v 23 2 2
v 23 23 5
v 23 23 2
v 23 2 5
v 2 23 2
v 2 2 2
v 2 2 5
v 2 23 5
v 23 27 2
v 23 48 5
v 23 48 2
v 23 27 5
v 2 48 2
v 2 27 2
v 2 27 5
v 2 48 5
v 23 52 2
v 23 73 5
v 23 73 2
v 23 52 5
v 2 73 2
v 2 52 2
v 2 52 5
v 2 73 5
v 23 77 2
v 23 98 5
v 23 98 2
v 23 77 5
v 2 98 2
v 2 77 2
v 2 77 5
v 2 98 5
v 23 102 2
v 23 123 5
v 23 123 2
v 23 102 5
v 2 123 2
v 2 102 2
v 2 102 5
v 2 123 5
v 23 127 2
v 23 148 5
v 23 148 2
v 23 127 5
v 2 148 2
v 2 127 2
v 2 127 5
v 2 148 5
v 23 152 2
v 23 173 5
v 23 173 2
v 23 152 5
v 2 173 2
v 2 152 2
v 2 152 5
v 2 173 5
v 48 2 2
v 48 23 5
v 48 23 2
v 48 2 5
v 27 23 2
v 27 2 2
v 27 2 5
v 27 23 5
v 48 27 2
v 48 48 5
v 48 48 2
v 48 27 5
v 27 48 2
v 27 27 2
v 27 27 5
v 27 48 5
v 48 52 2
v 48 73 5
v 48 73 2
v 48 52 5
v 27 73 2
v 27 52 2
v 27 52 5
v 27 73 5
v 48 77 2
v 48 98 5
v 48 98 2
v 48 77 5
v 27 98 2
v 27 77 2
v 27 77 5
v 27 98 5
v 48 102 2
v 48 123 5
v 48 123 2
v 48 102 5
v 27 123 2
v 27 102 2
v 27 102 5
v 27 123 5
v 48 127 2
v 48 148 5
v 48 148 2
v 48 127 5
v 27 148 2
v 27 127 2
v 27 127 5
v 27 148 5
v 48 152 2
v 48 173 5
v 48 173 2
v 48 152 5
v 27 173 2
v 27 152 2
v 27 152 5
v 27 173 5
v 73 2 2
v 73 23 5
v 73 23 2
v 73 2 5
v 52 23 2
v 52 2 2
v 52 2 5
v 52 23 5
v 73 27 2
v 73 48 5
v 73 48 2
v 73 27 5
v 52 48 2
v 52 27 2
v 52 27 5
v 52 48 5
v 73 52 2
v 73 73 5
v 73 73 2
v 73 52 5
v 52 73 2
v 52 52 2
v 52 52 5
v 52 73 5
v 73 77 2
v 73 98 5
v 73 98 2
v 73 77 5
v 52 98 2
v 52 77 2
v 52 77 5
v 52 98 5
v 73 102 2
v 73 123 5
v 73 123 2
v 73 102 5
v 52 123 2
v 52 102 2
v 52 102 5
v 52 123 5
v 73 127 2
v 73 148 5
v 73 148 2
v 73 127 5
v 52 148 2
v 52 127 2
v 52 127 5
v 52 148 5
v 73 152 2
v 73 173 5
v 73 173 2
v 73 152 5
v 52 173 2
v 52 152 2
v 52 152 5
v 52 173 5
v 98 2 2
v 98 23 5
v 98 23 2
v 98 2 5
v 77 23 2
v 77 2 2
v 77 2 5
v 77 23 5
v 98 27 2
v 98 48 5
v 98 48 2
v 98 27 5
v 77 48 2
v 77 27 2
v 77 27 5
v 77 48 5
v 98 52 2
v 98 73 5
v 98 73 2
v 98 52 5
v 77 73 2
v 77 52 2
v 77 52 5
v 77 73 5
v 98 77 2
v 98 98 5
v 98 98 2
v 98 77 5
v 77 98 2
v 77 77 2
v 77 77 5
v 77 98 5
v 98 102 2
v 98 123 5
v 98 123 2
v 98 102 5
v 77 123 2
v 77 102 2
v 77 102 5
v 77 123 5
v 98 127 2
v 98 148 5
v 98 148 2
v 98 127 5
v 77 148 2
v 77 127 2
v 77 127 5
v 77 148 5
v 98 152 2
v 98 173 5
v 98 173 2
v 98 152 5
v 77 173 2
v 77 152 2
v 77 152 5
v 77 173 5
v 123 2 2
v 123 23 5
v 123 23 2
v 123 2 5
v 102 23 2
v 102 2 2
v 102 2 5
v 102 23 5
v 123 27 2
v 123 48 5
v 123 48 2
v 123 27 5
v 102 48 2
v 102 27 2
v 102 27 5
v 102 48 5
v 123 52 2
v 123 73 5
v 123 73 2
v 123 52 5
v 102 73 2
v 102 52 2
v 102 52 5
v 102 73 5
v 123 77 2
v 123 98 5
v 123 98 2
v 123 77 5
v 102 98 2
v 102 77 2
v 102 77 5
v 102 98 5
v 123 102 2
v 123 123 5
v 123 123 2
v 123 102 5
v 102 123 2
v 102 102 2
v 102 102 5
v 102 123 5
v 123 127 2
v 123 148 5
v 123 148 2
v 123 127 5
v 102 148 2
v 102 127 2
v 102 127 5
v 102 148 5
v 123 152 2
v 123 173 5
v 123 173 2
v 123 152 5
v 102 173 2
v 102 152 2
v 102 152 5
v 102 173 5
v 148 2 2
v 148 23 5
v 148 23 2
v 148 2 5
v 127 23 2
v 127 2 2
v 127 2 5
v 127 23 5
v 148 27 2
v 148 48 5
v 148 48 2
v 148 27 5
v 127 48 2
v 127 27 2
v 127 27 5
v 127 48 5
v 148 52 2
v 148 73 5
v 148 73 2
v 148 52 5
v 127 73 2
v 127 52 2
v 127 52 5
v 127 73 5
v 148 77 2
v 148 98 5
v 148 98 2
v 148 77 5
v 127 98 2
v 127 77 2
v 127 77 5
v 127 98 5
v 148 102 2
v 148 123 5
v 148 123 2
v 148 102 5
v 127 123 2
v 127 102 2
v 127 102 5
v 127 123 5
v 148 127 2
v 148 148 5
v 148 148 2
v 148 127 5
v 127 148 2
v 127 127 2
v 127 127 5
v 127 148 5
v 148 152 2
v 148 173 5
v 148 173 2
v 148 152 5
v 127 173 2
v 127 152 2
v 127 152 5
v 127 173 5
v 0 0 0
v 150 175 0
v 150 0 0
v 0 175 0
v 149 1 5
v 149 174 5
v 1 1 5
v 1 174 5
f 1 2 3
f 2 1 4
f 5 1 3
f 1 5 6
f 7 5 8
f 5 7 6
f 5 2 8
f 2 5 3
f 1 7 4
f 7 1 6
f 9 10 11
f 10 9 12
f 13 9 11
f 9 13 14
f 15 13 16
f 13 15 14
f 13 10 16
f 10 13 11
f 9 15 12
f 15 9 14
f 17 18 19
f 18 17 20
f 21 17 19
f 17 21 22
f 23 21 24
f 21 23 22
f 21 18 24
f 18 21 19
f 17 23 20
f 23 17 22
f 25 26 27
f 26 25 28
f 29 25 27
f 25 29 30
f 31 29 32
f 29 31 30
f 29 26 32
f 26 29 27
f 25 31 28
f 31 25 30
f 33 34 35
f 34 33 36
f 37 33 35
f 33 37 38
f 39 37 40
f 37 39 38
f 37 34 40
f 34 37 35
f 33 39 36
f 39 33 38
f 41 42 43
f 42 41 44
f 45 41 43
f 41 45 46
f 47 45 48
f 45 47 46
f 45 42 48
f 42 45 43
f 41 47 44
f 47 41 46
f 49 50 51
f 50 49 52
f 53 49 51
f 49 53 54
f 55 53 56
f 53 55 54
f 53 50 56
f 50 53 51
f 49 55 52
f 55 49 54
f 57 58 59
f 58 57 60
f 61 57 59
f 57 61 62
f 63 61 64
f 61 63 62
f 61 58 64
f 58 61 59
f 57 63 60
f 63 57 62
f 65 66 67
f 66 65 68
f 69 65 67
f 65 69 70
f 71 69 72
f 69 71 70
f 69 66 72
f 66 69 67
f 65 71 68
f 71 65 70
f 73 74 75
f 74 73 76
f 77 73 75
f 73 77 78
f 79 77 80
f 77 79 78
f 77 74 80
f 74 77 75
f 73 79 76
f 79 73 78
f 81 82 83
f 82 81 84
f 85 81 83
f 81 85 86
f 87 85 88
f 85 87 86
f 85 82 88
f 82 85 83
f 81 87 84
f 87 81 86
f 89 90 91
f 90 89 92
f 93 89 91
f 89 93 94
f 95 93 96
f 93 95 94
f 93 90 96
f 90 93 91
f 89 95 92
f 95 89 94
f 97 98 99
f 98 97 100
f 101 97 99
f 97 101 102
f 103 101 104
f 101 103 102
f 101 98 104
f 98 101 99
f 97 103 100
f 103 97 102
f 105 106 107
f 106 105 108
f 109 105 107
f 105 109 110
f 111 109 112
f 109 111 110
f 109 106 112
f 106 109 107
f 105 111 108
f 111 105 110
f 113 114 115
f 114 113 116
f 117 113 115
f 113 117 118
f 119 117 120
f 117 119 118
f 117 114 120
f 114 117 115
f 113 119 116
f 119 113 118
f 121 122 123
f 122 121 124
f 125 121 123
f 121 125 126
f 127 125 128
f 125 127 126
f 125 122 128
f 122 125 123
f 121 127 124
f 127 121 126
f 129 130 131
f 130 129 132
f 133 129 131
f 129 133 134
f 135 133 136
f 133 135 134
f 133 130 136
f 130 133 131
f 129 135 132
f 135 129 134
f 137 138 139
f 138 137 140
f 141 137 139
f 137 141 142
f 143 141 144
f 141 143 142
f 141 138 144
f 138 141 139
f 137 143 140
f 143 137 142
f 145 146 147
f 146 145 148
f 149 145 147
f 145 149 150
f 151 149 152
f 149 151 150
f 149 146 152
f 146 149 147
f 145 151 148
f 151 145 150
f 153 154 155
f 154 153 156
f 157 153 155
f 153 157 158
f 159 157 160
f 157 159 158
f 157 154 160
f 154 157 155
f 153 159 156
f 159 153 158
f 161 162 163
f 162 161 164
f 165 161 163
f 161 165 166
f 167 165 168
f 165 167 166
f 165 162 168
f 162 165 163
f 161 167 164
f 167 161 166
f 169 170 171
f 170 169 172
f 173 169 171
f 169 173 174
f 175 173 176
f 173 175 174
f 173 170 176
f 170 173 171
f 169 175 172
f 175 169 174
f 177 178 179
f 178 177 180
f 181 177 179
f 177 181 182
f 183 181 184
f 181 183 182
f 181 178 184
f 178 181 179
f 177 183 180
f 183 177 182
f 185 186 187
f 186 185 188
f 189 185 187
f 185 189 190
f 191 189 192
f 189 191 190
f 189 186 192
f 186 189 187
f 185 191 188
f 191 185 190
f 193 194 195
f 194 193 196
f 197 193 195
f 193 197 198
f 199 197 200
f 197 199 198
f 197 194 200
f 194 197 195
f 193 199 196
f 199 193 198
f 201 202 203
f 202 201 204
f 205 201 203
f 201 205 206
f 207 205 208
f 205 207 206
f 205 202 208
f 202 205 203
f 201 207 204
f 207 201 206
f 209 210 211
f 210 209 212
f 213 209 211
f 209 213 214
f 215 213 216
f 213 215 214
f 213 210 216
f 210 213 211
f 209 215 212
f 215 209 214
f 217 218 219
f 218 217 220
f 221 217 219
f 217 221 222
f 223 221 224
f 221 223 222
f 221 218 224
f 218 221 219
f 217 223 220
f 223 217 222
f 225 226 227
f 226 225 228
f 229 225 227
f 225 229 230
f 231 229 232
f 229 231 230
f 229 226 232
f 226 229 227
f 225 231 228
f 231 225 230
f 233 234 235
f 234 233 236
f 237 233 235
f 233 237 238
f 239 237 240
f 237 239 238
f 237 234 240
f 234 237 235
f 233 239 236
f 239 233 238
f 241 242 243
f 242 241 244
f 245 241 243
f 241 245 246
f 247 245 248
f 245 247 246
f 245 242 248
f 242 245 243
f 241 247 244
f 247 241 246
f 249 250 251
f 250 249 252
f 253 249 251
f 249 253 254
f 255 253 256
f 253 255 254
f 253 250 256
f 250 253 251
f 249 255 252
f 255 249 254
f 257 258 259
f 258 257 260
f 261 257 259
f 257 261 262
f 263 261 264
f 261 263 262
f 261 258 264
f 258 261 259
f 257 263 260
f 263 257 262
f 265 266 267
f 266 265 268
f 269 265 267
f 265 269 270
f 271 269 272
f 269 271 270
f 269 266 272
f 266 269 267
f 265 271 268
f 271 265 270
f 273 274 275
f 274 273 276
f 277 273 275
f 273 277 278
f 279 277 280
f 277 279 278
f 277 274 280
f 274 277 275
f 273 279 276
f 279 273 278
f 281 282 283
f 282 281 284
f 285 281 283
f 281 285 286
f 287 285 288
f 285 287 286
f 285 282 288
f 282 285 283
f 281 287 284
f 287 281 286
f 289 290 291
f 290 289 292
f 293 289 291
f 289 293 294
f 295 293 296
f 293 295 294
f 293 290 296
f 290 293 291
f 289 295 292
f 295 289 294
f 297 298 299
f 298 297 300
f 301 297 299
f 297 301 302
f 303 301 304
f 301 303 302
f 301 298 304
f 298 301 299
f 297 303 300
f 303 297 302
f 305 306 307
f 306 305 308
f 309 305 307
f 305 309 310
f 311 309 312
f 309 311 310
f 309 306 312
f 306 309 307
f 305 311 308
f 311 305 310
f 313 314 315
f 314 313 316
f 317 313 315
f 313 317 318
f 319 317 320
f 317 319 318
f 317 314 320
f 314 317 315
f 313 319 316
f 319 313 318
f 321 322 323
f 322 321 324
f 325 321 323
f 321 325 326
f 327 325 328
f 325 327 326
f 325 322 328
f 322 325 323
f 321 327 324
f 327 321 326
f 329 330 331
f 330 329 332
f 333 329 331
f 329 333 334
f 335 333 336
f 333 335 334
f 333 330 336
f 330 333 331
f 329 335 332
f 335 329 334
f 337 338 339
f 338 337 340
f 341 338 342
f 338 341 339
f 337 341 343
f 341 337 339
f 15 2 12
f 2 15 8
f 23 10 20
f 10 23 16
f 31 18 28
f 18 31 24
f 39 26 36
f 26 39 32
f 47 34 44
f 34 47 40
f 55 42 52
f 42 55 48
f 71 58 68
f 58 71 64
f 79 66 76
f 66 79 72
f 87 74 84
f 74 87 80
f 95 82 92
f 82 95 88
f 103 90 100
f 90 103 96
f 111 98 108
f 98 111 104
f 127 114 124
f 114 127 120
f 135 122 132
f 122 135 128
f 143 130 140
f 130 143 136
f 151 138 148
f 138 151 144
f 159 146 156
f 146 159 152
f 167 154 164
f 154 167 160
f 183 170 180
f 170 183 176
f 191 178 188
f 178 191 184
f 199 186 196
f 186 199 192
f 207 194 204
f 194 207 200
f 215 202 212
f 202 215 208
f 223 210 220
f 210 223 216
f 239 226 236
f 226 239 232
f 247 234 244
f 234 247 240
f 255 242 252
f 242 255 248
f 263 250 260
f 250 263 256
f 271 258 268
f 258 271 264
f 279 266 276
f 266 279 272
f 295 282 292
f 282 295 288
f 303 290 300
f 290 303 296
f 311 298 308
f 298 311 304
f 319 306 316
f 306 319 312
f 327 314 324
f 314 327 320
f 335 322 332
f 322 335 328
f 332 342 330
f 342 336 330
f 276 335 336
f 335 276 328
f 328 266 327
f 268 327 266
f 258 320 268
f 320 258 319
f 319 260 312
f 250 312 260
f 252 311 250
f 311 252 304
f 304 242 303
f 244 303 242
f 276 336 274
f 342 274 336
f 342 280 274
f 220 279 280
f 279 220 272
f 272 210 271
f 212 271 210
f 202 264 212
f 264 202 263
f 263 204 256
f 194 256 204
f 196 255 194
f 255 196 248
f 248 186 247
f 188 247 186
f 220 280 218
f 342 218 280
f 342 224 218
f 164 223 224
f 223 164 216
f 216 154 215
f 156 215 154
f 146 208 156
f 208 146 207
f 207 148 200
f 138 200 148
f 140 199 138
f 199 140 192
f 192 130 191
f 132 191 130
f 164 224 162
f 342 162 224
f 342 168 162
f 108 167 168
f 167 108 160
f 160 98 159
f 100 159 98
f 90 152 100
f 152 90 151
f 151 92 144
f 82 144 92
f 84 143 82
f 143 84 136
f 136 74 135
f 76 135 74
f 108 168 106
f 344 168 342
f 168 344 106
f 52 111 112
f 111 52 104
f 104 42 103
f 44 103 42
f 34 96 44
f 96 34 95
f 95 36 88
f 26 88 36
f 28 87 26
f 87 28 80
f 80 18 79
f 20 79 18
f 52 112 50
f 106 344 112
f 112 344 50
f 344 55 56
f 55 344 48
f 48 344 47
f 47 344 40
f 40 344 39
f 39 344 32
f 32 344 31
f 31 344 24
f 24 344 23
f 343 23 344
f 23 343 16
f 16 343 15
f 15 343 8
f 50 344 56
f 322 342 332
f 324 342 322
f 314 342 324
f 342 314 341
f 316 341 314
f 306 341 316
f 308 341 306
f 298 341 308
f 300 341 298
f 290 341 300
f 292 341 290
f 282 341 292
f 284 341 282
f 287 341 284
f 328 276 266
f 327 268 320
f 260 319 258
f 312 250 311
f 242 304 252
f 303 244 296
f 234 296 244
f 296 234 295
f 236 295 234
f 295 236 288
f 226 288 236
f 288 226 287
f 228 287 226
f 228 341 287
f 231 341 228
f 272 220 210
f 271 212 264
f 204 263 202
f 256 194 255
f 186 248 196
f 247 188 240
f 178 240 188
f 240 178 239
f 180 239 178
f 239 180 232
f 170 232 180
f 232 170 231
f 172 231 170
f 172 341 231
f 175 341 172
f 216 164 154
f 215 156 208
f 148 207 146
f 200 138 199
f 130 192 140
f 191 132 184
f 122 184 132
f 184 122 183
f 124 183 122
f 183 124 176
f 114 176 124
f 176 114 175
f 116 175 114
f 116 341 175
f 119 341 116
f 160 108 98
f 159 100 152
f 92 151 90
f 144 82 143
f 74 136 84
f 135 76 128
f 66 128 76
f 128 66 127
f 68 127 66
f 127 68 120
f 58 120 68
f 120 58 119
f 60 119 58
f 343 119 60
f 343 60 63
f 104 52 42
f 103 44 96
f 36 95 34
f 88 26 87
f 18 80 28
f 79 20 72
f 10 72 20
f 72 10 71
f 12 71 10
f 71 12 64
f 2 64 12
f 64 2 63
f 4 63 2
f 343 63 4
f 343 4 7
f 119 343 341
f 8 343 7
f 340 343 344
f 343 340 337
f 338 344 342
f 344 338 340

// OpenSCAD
// Copyright 2023 Stefano Linguerri
//
// Licensed under the Apache License, Version 2.0 (the "License");
// you may not use this file except in compliance with the License.
// You may obtain a copy of the License at
// http://www.apache.org/licenses/LICENSE-2.0
//
// Unless required by applicable law or agreed to in writing, software
// distributed under the License is distributed on an "AS IS" BASIS,
// WITHOUT WARRANTIES OR CONDITIONS OF ANY KIND, either express or implied.¢
// See the License for the specific language governing permissions and
// limitations under the License.

//Number of columns for this tray
cols = 6;
//Number of rows for this tray
rows = 7;
//heigh (thickness) of this tray
height = 5;
//new base width 
new_base_width = 25;
//new base length 
new_base_length = 25;
// existing base width of adapted models
adapted_base_width = 21;//.1
// existing base length of adapted models
adapted_base_length = 21;//.1
//minimum bottom height (thickness) of the insets for the bases
height_offset = 2;
//Inset of the top of the tray: greater the value greater the slope of the tray
inset = 1;
//if base adapted are round (in this case adapted_base_width is considered as the diameter of the round base)
isRound_adapted = false;
//magnets height (if greater than 1 will generate the insets)
magnets_height = 0.0;//.1
//magnets radius
magnets_radius = 0.0;//.1
//if the tray is for lance formation, use only the number of rows to genrate the tray
is_lance_formation = false;
//Create a standard (non an adpater) movement tray for given new_base_length x new_base_width
create_empty_movement_tray = false;
empty_Movement_Tray_Type="S"; // [4:four walls, 3:Three walls]
//Put a mark to show the new base widh/length on the adapter
markBases = false;

module tray(cols, rows, height, new_base_width, new_base_length, adapted_base_width, adapted_base_length, inset, margin_for_empty_tray) {
    
        b_total_cols = (new_base_width * cols) + margin_for_empty_tray;
        b_total_rows = (new_base_length * rows)+ margin_for_empty_tray;
        
        t_total_cols = (new_base_width * cols - inset *2) + margin_for_empty_tray;
        t_total_rows = (new_base_length * rows - inset *2) + margin_for_empty_tray;
        
         polyhedron(
            points=[
                    [0,0,0],                        //base bottom left
                    [b_total_cols,0,0],             //base bottom right
                    [b_total_cols,b_total_rows,0],  //base top right
                    [0,b_total_rows,0],             //base top left
        

                    [inset,  inset,   height],                              //surface bottom left
                    [inset + t_total_cols, inset,  height],                 //surface bottom right
                    [inset + t_total_cols, inset + t_total_rows, height],   //surface top right
                    [inset,   inset + t_total_rows,  height]                //surface top left
                ],
            faces =[
                        [0,1,2,3],
                        [4,5,1,0],
                        [5,6,2,1],
                        [6,7,3,2],
                        [7,4,0,3],
                        [7,6,5,4]
                    ]
        ); 
   
}

//this module will create the hole in the "empty" classic movement tray
module empty_tray_hole(cols, rows, height_offset, new_base_width,  new_base_length, adapted_base_width, adapted_base_length, inset, margin_for_empty_tray,empty_Movement_Tray_Type) {
    
    t_total_cols = (new_base_width * cols ) ;
    t_total_rows = (new_base_length * rows);

 
    translate( 
                [margin_for_empty_tray/2, //row
               margin_for_empty_tray/2, //col
                height_offset]
    )                       

    if(empty_Movement_Tray_Type == "3"){
        cube([t_total_cols,t_total_rows+margin_for_empty_tray, 30]);            
    }else{
        cube([t_total_cols,t_total_rows, 30]);            
    }    
}

module adapted_base_holes(cols, rows, height_offset, new_base_width,  new_base_length, adapted_base_width, adapted_base_length) {
    
    gap_w = new_base_width - adapted_base_width;
    gap_l = new_base_length - adapted_base_length;

    for (c = [0:cols-1]){
        for (r = [0:rows-1]){
           translate( 
                        [gap_w/2 + (c*adapted_base_width) + (c*gap_w), //row
                        gap_l/2 + (r*adapted_base_length) + (r*gap_l), //col
                        height_offset]
            )                       
            cube([adapted_base_width,adapted_base_length, 30]);
            
        }
    }
}

module adapted_base_holes_round(cols, rows, height_offset, new_base_width, new_base_length, adapted_base_width, adapted_base_length) {
    
    for (c = [0:cols-1]){
        for (r = [0:rows-1]){
            translate( 
                        [new_base_width/2 + new_base_width * c , //row
                        new_base_length/2 + new_base_length * r, //col
                        height_offset]
            )
            //resize([adapted_base_width,adapted_base_length]) 
            cylinder(r = adapted_base_width/2, h = height);
           
        }
    }
}

module magnets_holes (cols, rows,  new_base_width, new_base_length, magnets_height, magnets_radius, height, height_offset) {
    
    for (c = [0:cols-1]){
        for (r = [0:rows-1]){
            translate( 
                        [new_base_width/2 + new_base_width * c , //row
                        new_base_length/2 + new_base_length * r, //col
                        height_offset-magnets_height+0.01]
            )
            cylinder(r = magnets_radius/2, h = magnets_height+0.01,$fn=20);
           
        }
    }
}

/// BASE MARKER
module mark_new_bases (cols, rows,  new_base_width, new_base_length, magnets_height, magnets_radius, height, height_offset) {
    color ([0.9, 0.4, 0.4])
                    {
        for (c = [1:cols-1]){
            translate( 
                [new_base_width * c-inset/2 , //col
                 new_base_length * 0, //row
                 height+height/5]
            )

            rotate([-90,0,0]) {             
                linear_extrude(new_base_length*rows) {
                     polygon(points=[[0,0],[1,0],[inset/2,(height-height_offset)]], paths=[[0,1,2]]);
                }
            }           
        }
        
        
        for (r = [1:rows-1]){
            translate( 
                    [new_base_width * 0 , //col
                     new_base_length * r-inset/2, //row
                     height+height/5]
            )
            rotate([90,90,90]) { 
                linear_extrude(new_base_width*cols) {
                    polygon(points=[[0,1],[(height-height_offset),inset/2],[0,0]], paths=[[0,1,2]]);
                }
            }
        }
    }
}

module lance_formation (cols, rows,  new_base_width, new_base_length, magnets_height, magnets_radius, height, height_offset,  inset, margin_for_empty_tray) {
    
    
    for (thisRow = [0:rows-1]){    

        translate( [0,thisRow*new_base_length,0]){
            for (thisCol = [0:thisRow]){    
                translate( [(new_base_width/2)*thisRow-(new_base_width*thisCol),0,0]){
                    //color([0.4, rands(0.01, 1,1)[0],rands(0.01, 1,1)[0] ])
                    color ([0.5, 0.5, 0.5])
                    {
                        lance_sloped_slot(thisCol+1, thisRow+1 == rows, height, new_base_width, new_base_length, adapted_base_width, adapted_base_length, inset, margin_for_empty_tray);
                    }    
                }
            }
        }
    }     
}

////////////////////////////////
// LANCE FORMATION            //
////////////////////////////////
module lance_sloped_slot(cols, isLastRow, height, new_base_width, new_base_length, adapted_base_width, adapted_base_length, inset, margin_for_empty_tray) {
    
        rows = 1;
    
        b_total_cols = (new_base_width * cols) + margin_for_empty_tray;
        b_total_rows = (new_base_length * rows)+ margin_for_empty_tray;
        
        t_total_cols = (new_base_width * cols - inset *2) + margin_for_empty_tray;
        t_total_rows = (new_base_length * rows - inset *2) + margin_for_empty_tray;

    

        polyhedron(
            points=[
                    [0,0,0],                        //base bottom left
                    [b_total_cols,0,0],             //base bottom right
                    [b_total_cols,b_total_rows,0],  //base top right
                    [0,b_total_rows,0],             //base top left
        
                    [inset,  inset,   height],                              //surface bottom left
                    [inset + t_total_cols, inset,  height],                 //surface bottom right
                    [inset + t_total_cols,  
                        isLastRow ? inset + t_total_rows : inset*3 + t_total_rows, //if last row we set the slope otherwise we move the y of the point to reach the next row
                        height],   //surface top right
                    [inset, 
                        isLastRow ? inset + t_total_rows : inset*3 + t_total_rows,//if last row we set the slope otherwise we move the y of the point to reach the next row
                        height]//surface top left
                ],
            faces =[
                        [0,1,2,3],
                        [4,5,1,0],
                        [5,6,2,1],
                        [6,7,3,2],
                        [7,4,0,3],
                        [7,6,5,4]
                    ]
        ); 
   
}


module lance_formation_hole (cols, rows,  new_base_width, new_base_length, magnets_height, magnets_radius, height, height_offset) {
    
    gap_w = new_base_width - adapted_base_width;
    gap_l = new_base_length - adapted_base_length;
    
    for (thisRow = [0:rows-1]){    

        translate( [0,thisRow*new_base_length+gap_l/2,height_offset]){
            for (thisCol = [0:thisRow]){                    
                translate( [(new_base_width/2)*thisRow-(new_base_width*thisCol)+gap_w/2,0,0]){
                    color([0.7, 0.7,0.7 ]){
                        cube([adapted_base_width, adapted_base_length,height+2 ]);
                    }    
                }
            }
        }
    }     
}

//Standard movement tray
module lance_formation_tray_hole (cols, rows,  new_base_width, new_base_length, magnets_height, magnets_radius, height, height_offset, inset, margin_for_empty_tray, empty_Movement_Tray_Type) {
    
    gap_w = new_base_width - adapted_base_width;
    gap_l = new_base_length - adapted_base_length;
    
    for (thisRow = [0:rows-1]){    

        translate( [0,thisRow*new_base_length+margin_for_empty_tray/2,height_offset]){
            for (thisCol = [0:thisRow]){                    
                translate( [(new_base_width/2)*thisRow-(new_base_width*thisCol)+margin_for_empty_tray/2,0,0]){
                    color([0.7, 0.7,0.7 ]){
                    
                        if(empty_Movement_Tray_Type == "3"){
                            cube([new_base_width, new_base_length+margin_for_empty_tray,height+2 ]);            
                        }else{
                            cube([new_base_width+0.01, new_base_length+0.01,height+2 ]);    
                        } 
                    }    
                }
            }
        }
    }     
}

module lance_formation_magnets_hole (cols, rows,  new_base_width, new_base_length, magnets_height, magnets_radius, height, height_offset) {
    
    gap_w = new_base_width - adapted_base_width;
    gap_l = new_base_length - adapted_base_length;
    
    for (thisRow = [0:rows-1]){    

        translate( [0,(thisRow+1)*new_base_length-new_base_length/2,height_offset-magnets_height+0.01]){
            for (thisCol = [0:thisRow]){                    
                translate( [(new_base_width/2)*thisRow-(new_base_width*thisCol)+gap_w/2+new_base_width/2,0,0]){
                    color([0.7, 0.7,0.7 ]){
                        cylinder(r = magnets_radius/2, h = magnets_height+0.01,$fn=20);
                    }    
                }
            }
        }
    }     
}

//Ranked movement tray
if(!is_lance_formation){
    difference(){        
            color ([0.5, 0.5, 0.5]) {
                if(!create_empty_movement_tray){
                    tray(cols, rows, height, new_base_width, new_base_length, adapted_base_width, adapted_base_length, inset, 0);
                }else{
                    tray(cols, rows, height, new_base_width, new_base_length, adapted_base_width, adapted_base_length, inset, 3);
                }
            }
            color ([0.7, 0.7, 0.7]) {
                if (magnets_height > 0){
                    echo ("magnets");
                    magnets_holes (cols, rows,  new_base_width, new_base_length, magnets_height, magnets_radius,height, height_offset);
                }
                if(!create_empty_movement_tray){
                    if(!isRound_adapted){
                        adapted_base_holes(cols, rows, height_offset, new_base_width, new_base_length, adapted_base_width, adapted_base_length);
                    }else{
                        adapted_base_holes_round(cols, rows, height_offset, new_base_width, new_base_length, adapted_base_width, adapted_base_length);
                    }
                }else{//Add here the logic for the 4th back wall
                    empty_tray_hole(cols, rows, height_offset, new_base_width,  new_base_length, adapted_base_width, adapted_base_length, inset, 3,empty_Movement_Tray_Type);
                }
            }
            
            if(markBases){
                echo("mark it");
                mark_new_bases (cols, rows,  new_base_width, new_base_length, magnets_height, magnets_radius, height, height_offset);
            }
        
    }
}

//Lance formation movment tray
if(is_lance_formation){    
    difference(){      
        if(!create_empty_movement_tray){
            union() {
                lance_formation (cols, rows,  new_base_width, new_base_length, magnets_height, magnets_radius, height, height_offset, inset, 0);
            }
        }else{
            union() {
                lance_formation (cols, rows,  new_base_width, new_base_length, magnets_height, magnets_radius, height, height_offset, inset, 3);
            }
        }
        
        if(!create_empty_movement_tray){
            lance_formation_hole (cols, rows,  new_base_width, new_base_length, magnets_height, magnets_radius, height, height_offset);    
        }else{
            lance_formation_tray_hole(cols, rows,  new_base_width, new_base_length, magnets_height, magnets_radius, height, height_offset, inset, 3, empty_Movement_Tray_Type);
        }
        
        if (magnets_height > 0){
            echo ("magnets lance");
            lance_formation_magnets_hole (cols, rows,  new_base_width, new_base_length, magnets_height, magnets_radius,height, height_offset);
        }
    }
}
